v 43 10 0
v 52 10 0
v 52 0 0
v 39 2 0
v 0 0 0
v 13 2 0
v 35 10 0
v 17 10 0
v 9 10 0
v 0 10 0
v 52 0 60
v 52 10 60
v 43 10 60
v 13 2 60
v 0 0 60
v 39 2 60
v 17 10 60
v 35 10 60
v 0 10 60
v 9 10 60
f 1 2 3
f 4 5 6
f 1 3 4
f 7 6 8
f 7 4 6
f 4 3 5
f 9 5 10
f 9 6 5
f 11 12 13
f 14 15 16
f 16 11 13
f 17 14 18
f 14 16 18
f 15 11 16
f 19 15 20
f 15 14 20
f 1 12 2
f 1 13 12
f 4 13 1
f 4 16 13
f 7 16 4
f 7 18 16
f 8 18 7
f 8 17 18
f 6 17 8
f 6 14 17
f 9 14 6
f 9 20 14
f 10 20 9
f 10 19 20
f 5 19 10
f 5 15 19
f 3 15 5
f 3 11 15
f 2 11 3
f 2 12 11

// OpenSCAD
$fn = 32;

// ----------------------------------------------------------------------
// V guide rail: doublev, 52 mm wide
// ----------------------------------------------------------------------

// --- parameters (mm) ---
rail_w = 52;              // rail width, X
base_t = 10;              // base plate thickness
v_depth = 8;              // V feature depth / height
v_half_w = 8;             // half width of the V at the base face
plate_t = 60;             // rail length, Z (the extrusion height)
groove_off = 13;          // offset of each groove from the centreline
fit_tol = 0.05;           // declared fit tolerance (prompt contract)
free_tol = 0.3;           // declared free tolerance (prompt contract)

centre_x = rail_w / 2;  // rail centreline
groove_a = centre_x - groove_off;  // axis of the first groove
groove_b = centre_x + groove_off;  // axis of the second groove

profile = [[0, 0], [52, 0], [52, 10], [43, 10], [39, 2], [35, 10], [17, 10], [13, 2], [9, 10], [0, 10]];  // primary outline, 10 points, counter clockwise

// --- the one profile operation ---
linear_extrude(height = plate_t) polygon(points = profile);
